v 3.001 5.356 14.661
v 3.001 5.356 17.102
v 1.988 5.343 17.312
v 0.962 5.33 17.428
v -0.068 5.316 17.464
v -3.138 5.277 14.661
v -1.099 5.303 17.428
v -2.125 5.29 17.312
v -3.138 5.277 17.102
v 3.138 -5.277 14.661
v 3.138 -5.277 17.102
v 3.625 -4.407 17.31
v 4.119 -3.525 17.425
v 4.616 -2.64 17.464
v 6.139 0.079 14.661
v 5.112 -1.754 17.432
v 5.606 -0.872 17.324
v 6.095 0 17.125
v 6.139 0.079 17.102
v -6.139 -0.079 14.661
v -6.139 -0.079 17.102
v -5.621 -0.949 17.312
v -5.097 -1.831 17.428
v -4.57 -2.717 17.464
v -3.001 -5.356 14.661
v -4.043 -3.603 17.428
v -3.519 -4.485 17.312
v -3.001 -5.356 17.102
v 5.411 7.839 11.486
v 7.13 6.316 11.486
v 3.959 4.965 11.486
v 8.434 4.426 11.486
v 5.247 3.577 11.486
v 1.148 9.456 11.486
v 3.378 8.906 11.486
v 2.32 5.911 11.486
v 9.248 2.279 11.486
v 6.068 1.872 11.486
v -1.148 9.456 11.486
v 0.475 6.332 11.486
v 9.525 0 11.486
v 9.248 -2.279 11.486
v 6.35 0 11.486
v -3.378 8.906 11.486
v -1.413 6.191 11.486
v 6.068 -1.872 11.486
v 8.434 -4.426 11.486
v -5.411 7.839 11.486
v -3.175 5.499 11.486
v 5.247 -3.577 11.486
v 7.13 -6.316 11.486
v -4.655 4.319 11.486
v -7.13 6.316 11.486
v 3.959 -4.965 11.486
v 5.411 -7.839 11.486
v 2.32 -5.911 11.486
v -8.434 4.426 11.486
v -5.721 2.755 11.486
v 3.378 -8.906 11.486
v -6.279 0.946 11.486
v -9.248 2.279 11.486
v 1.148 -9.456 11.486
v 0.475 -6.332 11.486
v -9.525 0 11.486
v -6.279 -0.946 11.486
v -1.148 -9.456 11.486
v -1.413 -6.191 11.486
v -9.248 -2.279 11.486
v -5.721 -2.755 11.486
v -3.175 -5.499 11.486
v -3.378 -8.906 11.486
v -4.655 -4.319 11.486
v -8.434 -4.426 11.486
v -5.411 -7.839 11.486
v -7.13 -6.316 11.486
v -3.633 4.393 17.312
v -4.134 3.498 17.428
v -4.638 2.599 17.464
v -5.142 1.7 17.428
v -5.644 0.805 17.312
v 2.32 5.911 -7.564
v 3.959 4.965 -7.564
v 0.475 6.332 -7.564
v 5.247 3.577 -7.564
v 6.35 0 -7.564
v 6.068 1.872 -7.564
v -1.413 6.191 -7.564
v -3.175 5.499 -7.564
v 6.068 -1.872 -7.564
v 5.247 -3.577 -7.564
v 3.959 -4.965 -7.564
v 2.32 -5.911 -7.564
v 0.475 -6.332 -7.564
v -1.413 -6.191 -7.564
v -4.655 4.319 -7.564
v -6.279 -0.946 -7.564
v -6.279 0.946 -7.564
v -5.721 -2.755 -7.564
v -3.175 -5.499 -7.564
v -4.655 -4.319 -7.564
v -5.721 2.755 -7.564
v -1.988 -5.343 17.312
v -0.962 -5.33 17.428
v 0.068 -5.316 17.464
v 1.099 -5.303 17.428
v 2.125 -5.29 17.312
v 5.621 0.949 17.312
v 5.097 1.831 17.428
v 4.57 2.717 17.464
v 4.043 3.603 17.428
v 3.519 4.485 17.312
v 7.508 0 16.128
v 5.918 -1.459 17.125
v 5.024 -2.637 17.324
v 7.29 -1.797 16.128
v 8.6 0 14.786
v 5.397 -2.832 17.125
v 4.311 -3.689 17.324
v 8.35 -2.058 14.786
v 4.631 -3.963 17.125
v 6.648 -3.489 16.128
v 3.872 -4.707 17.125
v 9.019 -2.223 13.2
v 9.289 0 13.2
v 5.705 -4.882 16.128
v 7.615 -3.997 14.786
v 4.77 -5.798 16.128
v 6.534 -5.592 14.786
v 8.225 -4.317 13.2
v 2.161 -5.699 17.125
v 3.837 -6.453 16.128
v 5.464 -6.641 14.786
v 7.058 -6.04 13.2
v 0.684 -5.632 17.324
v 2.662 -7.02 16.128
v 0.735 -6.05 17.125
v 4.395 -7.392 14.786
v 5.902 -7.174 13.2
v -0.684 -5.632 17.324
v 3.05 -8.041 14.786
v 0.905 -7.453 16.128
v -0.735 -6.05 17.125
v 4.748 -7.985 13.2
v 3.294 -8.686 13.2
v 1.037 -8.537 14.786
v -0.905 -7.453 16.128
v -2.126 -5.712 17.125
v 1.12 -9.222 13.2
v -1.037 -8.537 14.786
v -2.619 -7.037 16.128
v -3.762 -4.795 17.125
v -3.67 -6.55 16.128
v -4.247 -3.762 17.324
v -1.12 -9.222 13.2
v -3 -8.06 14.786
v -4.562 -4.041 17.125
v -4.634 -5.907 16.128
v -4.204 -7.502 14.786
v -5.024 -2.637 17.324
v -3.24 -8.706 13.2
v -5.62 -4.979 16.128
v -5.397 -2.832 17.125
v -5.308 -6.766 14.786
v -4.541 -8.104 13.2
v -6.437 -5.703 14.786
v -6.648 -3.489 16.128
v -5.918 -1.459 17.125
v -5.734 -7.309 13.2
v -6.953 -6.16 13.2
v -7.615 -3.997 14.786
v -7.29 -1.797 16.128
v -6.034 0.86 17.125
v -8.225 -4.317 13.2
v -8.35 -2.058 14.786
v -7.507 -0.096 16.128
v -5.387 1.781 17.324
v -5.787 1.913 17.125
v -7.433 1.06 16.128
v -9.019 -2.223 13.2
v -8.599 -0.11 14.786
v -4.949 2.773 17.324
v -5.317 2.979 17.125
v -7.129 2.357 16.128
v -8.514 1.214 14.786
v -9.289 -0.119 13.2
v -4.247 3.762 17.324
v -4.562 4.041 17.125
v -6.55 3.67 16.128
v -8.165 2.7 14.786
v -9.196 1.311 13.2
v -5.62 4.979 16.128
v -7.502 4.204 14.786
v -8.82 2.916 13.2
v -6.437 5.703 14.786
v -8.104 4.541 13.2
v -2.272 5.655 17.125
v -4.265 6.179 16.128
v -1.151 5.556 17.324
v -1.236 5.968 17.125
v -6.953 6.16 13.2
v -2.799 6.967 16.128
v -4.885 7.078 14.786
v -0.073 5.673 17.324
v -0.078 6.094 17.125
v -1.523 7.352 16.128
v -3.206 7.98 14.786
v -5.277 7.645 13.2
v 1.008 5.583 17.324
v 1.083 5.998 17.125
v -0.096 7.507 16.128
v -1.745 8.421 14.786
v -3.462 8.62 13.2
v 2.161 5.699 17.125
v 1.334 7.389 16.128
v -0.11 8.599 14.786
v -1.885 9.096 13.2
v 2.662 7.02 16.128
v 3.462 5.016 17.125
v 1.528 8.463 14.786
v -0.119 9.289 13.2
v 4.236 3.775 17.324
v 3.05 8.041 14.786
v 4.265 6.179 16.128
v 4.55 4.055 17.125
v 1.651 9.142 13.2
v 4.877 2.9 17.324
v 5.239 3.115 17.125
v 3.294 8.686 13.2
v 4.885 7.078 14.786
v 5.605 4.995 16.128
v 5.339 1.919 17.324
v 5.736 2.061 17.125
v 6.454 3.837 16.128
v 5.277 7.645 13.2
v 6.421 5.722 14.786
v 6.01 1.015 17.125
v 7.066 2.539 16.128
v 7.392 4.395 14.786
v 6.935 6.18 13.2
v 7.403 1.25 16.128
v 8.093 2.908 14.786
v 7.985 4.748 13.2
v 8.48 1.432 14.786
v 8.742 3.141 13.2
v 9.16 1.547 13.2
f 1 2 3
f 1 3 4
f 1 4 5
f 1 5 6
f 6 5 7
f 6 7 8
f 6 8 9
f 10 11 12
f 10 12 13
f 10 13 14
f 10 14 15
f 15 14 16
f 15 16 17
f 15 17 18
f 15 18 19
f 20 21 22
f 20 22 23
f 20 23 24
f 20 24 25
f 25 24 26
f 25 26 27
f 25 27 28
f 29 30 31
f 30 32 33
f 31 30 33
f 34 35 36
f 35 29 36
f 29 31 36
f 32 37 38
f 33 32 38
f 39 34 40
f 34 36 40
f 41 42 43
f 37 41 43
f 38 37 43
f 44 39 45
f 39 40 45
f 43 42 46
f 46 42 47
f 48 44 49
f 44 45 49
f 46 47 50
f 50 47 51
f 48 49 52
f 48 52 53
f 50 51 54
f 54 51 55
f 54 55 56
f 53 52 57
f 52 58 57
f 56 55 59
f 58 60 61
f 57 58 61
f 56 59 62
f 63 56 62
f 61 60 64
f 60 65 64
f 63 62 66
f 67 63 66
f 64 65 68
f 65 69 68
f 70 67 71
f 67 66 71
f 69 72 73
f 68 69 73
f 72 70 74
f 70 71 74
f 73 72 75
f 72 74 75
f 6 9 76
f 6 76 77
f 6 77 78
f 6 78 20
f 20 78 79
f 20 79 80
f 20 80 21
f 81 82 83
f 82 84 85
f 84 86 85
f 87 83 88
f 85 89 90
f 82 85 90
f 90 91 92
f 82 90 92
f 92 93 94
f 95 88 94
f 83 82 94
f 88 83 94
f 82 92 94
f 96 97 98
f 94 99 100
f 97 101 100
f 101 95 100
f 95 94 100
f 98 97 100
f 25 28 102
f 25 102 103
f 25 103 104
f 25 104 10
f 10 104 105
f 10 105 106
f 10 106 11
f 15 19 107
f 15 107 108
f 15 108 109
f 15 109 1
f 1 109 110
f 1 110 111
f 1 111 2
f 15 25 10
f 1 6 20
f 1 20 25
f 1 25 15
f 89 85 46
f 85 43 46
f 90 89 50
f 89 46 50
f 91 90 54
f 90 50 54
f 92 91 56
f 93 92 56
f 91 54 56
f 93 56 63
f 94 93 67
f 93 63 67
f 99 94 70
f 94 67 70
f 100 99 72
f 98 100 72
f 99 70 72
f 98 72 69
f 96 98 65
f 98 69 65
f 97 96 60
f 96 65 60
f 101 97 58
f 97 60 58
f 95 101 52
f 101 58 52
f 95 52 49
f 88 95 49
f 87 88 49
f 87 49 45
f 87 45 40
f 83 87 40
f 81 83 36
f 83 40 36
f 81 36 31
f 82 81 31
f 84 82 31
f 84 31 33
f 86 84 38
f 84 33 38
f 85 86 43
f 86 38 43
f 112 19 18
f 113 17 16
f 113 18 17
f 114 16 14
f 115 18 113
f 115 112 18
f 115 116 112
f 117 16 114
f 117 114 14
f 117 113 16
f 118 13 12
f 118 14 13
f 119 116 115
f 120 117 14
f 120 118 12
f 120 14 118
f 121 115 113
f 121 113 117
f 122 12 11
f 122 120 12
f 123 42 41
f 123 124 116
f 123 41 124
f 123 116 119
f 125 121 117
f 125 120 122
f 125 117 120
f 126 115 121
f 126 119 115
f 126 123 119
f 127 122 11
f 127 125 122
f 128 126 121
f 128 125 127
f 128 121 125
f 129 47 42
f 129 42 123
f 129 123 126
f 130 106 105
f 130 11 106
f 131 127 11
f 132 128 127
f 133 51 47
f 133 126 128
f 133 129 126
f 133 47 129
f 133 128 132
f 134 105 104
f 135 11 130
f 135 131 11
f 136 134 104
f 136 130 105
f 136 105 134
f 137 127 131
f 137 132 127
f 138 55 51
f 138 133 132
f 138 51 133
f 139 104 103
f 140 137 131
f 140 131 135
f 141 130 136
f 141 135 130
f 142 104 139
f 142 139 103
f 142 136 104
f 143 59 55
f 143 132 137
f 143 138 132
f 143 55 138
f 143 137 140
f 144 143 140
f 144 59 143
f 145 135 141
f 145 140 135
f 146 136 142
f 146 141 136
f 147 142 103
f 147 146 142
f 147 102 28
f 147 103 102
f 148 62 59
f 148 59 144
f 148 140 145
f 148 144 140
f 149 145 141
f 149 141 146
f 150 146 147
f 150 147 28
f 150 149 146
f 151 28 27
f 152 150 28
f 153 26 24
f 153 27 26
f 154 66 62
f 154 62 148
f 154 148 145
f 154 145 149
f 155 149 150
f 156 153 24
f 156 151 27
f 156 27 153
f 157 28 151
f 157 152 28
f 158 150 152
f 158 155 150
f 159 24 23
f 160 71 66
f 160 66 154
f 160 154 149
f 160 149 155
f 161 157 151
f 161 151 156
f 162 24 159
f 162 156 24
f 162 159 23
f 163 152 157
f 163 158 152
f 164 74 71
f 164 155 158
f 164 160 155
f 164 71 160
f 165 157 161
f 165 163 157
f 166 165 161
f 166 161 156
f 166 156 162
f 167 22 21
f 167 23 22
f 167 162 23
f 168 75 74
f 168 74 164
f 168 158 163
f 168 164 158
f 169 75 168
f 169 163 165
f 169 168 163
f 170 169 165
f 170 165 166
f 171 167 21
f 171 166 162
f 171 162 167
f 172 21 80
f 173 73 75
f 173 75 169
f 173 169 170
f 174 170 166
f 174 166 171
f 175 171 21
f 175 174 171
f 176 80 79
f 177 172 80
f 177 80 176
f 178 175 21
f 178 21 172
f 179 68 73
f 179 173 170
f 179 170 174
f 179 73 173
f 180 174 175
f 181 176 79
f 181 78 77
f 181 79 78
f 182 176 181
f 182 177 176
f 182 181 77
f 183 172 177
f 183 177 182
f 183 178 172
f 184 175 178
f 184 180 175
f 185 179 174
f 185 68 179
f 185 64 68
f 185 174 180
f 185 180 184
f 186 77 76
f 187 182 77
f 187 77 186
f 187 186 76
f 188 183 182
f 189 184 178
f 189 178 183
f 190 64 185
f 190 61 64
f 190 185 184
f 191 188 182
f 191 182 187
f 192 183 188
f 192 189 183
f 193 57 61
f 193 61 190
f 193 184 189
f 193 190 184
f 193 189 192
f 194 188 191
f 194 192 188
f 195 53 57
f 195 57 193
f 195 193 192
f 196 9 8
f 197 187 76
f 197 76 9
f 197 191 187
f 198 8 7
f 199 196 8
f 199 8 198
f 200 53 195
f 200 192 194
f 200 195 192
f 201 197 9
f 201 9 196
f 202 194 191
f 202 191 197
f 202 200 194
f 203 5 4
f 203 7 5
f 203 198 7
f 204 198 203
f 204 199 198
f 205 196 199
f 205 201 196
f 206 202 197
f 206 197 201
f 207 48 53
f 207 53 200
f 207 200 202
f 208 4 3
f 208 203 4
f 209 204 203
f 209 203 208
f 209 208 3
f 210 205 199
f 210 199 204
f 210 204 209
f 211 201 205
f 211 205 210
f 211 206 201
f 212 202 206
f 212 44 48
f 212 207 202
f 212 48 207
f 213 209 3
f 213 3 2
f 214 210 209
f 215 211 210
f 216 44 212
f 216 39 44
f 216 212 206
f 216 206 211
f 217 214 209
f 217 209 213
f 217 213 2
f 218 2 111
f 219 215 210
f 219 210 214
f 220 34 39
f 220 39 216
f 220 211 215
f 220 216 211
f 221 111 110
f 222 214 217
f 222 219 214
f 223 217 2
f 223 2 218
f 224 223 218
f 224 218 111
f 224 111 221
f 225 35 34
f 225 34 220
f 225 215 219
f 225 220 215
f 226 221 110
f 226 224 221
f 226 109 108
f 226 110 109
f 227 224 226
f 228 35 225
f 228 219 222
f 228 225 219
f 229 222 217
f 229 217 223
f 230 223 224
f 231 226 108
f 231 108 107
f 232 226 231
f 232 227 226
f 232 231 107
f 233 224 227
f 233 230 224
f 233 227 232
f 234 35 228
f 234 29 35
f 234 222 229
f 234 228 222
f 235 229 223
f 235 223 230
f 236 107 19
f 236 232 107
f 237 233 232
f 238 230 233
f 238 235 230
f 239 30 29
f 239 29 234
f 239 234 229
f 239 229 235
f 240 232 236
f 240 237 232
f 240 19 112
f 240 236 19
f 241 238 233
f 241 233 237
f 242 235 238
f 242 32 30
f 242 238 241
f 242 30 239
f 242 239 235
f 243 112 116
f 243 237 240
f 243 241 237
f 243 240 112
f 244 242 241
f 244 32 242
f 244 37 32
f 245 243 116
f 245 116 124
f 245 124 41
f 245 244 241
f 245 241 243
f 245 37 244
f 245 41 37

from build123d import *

# Parameters (mm, degrees)
F3_DEPTH = 3.175


# Not quite as in the source:
# - a fillet or chamfer that OpenCascade refuses, or shapes differently, is made with other operations: its cross-section is extruded or revolved along the edge and cut away or added


with BuildPart() as f1:
    # F0 (on Front) → F1 (revolve)
    with BuildSketch(Plane.XZ):
        Polygon((9.525, 17.8360301112), (0, 17.8360301112), (0, -7.5639698888), (6.35, -7.5639698888), (6.35, 11.4860301112), (9.525, 11.4860301112), align=None)
    revolve(axis=Axis((0, 0, 2.9950272292), (0, 0, -1)))

    # F2 (on face) → F3 (cut)
    with BuildSketch(Plane.XY.offset(17.8360301112)):
        Polygon((-3.001152127, -5.3557559125), (3.1376446132, -5.2769519389), (6.1387967402, 0.0788039736), (3.001152127, 5.3557559125), (-3.1376446132, 5.2769519389), (-6.1387967402, -0.0788039736), align=None)
    extrude(amount=-F3_DEPTH, mode=Mode.SUBTRACT)

    # F4: fillet of radius 6.35 on 1 edges, made by hand

    # F4_s1 → F4_t2 (revolve, cut)
    with BuildSketch(Plane.XZ):
        with BuildLine():
            ThreePointArc((3.175, 17.8360301112), (7.6651280605, 15.9761581718), (9.525, 11.4860301112))
            Line((9.525, 11.4860301112), (9.525, 17.8360301112))
            Line((9.525, 17.8360301112), (3.175, 17.8360301112))
        make_face()
    revolve(axis=Axis((0, 0, 17.8360301112), (0, 0, -1)), mode=Mode.SUBTRACT)


solid = f1.part
